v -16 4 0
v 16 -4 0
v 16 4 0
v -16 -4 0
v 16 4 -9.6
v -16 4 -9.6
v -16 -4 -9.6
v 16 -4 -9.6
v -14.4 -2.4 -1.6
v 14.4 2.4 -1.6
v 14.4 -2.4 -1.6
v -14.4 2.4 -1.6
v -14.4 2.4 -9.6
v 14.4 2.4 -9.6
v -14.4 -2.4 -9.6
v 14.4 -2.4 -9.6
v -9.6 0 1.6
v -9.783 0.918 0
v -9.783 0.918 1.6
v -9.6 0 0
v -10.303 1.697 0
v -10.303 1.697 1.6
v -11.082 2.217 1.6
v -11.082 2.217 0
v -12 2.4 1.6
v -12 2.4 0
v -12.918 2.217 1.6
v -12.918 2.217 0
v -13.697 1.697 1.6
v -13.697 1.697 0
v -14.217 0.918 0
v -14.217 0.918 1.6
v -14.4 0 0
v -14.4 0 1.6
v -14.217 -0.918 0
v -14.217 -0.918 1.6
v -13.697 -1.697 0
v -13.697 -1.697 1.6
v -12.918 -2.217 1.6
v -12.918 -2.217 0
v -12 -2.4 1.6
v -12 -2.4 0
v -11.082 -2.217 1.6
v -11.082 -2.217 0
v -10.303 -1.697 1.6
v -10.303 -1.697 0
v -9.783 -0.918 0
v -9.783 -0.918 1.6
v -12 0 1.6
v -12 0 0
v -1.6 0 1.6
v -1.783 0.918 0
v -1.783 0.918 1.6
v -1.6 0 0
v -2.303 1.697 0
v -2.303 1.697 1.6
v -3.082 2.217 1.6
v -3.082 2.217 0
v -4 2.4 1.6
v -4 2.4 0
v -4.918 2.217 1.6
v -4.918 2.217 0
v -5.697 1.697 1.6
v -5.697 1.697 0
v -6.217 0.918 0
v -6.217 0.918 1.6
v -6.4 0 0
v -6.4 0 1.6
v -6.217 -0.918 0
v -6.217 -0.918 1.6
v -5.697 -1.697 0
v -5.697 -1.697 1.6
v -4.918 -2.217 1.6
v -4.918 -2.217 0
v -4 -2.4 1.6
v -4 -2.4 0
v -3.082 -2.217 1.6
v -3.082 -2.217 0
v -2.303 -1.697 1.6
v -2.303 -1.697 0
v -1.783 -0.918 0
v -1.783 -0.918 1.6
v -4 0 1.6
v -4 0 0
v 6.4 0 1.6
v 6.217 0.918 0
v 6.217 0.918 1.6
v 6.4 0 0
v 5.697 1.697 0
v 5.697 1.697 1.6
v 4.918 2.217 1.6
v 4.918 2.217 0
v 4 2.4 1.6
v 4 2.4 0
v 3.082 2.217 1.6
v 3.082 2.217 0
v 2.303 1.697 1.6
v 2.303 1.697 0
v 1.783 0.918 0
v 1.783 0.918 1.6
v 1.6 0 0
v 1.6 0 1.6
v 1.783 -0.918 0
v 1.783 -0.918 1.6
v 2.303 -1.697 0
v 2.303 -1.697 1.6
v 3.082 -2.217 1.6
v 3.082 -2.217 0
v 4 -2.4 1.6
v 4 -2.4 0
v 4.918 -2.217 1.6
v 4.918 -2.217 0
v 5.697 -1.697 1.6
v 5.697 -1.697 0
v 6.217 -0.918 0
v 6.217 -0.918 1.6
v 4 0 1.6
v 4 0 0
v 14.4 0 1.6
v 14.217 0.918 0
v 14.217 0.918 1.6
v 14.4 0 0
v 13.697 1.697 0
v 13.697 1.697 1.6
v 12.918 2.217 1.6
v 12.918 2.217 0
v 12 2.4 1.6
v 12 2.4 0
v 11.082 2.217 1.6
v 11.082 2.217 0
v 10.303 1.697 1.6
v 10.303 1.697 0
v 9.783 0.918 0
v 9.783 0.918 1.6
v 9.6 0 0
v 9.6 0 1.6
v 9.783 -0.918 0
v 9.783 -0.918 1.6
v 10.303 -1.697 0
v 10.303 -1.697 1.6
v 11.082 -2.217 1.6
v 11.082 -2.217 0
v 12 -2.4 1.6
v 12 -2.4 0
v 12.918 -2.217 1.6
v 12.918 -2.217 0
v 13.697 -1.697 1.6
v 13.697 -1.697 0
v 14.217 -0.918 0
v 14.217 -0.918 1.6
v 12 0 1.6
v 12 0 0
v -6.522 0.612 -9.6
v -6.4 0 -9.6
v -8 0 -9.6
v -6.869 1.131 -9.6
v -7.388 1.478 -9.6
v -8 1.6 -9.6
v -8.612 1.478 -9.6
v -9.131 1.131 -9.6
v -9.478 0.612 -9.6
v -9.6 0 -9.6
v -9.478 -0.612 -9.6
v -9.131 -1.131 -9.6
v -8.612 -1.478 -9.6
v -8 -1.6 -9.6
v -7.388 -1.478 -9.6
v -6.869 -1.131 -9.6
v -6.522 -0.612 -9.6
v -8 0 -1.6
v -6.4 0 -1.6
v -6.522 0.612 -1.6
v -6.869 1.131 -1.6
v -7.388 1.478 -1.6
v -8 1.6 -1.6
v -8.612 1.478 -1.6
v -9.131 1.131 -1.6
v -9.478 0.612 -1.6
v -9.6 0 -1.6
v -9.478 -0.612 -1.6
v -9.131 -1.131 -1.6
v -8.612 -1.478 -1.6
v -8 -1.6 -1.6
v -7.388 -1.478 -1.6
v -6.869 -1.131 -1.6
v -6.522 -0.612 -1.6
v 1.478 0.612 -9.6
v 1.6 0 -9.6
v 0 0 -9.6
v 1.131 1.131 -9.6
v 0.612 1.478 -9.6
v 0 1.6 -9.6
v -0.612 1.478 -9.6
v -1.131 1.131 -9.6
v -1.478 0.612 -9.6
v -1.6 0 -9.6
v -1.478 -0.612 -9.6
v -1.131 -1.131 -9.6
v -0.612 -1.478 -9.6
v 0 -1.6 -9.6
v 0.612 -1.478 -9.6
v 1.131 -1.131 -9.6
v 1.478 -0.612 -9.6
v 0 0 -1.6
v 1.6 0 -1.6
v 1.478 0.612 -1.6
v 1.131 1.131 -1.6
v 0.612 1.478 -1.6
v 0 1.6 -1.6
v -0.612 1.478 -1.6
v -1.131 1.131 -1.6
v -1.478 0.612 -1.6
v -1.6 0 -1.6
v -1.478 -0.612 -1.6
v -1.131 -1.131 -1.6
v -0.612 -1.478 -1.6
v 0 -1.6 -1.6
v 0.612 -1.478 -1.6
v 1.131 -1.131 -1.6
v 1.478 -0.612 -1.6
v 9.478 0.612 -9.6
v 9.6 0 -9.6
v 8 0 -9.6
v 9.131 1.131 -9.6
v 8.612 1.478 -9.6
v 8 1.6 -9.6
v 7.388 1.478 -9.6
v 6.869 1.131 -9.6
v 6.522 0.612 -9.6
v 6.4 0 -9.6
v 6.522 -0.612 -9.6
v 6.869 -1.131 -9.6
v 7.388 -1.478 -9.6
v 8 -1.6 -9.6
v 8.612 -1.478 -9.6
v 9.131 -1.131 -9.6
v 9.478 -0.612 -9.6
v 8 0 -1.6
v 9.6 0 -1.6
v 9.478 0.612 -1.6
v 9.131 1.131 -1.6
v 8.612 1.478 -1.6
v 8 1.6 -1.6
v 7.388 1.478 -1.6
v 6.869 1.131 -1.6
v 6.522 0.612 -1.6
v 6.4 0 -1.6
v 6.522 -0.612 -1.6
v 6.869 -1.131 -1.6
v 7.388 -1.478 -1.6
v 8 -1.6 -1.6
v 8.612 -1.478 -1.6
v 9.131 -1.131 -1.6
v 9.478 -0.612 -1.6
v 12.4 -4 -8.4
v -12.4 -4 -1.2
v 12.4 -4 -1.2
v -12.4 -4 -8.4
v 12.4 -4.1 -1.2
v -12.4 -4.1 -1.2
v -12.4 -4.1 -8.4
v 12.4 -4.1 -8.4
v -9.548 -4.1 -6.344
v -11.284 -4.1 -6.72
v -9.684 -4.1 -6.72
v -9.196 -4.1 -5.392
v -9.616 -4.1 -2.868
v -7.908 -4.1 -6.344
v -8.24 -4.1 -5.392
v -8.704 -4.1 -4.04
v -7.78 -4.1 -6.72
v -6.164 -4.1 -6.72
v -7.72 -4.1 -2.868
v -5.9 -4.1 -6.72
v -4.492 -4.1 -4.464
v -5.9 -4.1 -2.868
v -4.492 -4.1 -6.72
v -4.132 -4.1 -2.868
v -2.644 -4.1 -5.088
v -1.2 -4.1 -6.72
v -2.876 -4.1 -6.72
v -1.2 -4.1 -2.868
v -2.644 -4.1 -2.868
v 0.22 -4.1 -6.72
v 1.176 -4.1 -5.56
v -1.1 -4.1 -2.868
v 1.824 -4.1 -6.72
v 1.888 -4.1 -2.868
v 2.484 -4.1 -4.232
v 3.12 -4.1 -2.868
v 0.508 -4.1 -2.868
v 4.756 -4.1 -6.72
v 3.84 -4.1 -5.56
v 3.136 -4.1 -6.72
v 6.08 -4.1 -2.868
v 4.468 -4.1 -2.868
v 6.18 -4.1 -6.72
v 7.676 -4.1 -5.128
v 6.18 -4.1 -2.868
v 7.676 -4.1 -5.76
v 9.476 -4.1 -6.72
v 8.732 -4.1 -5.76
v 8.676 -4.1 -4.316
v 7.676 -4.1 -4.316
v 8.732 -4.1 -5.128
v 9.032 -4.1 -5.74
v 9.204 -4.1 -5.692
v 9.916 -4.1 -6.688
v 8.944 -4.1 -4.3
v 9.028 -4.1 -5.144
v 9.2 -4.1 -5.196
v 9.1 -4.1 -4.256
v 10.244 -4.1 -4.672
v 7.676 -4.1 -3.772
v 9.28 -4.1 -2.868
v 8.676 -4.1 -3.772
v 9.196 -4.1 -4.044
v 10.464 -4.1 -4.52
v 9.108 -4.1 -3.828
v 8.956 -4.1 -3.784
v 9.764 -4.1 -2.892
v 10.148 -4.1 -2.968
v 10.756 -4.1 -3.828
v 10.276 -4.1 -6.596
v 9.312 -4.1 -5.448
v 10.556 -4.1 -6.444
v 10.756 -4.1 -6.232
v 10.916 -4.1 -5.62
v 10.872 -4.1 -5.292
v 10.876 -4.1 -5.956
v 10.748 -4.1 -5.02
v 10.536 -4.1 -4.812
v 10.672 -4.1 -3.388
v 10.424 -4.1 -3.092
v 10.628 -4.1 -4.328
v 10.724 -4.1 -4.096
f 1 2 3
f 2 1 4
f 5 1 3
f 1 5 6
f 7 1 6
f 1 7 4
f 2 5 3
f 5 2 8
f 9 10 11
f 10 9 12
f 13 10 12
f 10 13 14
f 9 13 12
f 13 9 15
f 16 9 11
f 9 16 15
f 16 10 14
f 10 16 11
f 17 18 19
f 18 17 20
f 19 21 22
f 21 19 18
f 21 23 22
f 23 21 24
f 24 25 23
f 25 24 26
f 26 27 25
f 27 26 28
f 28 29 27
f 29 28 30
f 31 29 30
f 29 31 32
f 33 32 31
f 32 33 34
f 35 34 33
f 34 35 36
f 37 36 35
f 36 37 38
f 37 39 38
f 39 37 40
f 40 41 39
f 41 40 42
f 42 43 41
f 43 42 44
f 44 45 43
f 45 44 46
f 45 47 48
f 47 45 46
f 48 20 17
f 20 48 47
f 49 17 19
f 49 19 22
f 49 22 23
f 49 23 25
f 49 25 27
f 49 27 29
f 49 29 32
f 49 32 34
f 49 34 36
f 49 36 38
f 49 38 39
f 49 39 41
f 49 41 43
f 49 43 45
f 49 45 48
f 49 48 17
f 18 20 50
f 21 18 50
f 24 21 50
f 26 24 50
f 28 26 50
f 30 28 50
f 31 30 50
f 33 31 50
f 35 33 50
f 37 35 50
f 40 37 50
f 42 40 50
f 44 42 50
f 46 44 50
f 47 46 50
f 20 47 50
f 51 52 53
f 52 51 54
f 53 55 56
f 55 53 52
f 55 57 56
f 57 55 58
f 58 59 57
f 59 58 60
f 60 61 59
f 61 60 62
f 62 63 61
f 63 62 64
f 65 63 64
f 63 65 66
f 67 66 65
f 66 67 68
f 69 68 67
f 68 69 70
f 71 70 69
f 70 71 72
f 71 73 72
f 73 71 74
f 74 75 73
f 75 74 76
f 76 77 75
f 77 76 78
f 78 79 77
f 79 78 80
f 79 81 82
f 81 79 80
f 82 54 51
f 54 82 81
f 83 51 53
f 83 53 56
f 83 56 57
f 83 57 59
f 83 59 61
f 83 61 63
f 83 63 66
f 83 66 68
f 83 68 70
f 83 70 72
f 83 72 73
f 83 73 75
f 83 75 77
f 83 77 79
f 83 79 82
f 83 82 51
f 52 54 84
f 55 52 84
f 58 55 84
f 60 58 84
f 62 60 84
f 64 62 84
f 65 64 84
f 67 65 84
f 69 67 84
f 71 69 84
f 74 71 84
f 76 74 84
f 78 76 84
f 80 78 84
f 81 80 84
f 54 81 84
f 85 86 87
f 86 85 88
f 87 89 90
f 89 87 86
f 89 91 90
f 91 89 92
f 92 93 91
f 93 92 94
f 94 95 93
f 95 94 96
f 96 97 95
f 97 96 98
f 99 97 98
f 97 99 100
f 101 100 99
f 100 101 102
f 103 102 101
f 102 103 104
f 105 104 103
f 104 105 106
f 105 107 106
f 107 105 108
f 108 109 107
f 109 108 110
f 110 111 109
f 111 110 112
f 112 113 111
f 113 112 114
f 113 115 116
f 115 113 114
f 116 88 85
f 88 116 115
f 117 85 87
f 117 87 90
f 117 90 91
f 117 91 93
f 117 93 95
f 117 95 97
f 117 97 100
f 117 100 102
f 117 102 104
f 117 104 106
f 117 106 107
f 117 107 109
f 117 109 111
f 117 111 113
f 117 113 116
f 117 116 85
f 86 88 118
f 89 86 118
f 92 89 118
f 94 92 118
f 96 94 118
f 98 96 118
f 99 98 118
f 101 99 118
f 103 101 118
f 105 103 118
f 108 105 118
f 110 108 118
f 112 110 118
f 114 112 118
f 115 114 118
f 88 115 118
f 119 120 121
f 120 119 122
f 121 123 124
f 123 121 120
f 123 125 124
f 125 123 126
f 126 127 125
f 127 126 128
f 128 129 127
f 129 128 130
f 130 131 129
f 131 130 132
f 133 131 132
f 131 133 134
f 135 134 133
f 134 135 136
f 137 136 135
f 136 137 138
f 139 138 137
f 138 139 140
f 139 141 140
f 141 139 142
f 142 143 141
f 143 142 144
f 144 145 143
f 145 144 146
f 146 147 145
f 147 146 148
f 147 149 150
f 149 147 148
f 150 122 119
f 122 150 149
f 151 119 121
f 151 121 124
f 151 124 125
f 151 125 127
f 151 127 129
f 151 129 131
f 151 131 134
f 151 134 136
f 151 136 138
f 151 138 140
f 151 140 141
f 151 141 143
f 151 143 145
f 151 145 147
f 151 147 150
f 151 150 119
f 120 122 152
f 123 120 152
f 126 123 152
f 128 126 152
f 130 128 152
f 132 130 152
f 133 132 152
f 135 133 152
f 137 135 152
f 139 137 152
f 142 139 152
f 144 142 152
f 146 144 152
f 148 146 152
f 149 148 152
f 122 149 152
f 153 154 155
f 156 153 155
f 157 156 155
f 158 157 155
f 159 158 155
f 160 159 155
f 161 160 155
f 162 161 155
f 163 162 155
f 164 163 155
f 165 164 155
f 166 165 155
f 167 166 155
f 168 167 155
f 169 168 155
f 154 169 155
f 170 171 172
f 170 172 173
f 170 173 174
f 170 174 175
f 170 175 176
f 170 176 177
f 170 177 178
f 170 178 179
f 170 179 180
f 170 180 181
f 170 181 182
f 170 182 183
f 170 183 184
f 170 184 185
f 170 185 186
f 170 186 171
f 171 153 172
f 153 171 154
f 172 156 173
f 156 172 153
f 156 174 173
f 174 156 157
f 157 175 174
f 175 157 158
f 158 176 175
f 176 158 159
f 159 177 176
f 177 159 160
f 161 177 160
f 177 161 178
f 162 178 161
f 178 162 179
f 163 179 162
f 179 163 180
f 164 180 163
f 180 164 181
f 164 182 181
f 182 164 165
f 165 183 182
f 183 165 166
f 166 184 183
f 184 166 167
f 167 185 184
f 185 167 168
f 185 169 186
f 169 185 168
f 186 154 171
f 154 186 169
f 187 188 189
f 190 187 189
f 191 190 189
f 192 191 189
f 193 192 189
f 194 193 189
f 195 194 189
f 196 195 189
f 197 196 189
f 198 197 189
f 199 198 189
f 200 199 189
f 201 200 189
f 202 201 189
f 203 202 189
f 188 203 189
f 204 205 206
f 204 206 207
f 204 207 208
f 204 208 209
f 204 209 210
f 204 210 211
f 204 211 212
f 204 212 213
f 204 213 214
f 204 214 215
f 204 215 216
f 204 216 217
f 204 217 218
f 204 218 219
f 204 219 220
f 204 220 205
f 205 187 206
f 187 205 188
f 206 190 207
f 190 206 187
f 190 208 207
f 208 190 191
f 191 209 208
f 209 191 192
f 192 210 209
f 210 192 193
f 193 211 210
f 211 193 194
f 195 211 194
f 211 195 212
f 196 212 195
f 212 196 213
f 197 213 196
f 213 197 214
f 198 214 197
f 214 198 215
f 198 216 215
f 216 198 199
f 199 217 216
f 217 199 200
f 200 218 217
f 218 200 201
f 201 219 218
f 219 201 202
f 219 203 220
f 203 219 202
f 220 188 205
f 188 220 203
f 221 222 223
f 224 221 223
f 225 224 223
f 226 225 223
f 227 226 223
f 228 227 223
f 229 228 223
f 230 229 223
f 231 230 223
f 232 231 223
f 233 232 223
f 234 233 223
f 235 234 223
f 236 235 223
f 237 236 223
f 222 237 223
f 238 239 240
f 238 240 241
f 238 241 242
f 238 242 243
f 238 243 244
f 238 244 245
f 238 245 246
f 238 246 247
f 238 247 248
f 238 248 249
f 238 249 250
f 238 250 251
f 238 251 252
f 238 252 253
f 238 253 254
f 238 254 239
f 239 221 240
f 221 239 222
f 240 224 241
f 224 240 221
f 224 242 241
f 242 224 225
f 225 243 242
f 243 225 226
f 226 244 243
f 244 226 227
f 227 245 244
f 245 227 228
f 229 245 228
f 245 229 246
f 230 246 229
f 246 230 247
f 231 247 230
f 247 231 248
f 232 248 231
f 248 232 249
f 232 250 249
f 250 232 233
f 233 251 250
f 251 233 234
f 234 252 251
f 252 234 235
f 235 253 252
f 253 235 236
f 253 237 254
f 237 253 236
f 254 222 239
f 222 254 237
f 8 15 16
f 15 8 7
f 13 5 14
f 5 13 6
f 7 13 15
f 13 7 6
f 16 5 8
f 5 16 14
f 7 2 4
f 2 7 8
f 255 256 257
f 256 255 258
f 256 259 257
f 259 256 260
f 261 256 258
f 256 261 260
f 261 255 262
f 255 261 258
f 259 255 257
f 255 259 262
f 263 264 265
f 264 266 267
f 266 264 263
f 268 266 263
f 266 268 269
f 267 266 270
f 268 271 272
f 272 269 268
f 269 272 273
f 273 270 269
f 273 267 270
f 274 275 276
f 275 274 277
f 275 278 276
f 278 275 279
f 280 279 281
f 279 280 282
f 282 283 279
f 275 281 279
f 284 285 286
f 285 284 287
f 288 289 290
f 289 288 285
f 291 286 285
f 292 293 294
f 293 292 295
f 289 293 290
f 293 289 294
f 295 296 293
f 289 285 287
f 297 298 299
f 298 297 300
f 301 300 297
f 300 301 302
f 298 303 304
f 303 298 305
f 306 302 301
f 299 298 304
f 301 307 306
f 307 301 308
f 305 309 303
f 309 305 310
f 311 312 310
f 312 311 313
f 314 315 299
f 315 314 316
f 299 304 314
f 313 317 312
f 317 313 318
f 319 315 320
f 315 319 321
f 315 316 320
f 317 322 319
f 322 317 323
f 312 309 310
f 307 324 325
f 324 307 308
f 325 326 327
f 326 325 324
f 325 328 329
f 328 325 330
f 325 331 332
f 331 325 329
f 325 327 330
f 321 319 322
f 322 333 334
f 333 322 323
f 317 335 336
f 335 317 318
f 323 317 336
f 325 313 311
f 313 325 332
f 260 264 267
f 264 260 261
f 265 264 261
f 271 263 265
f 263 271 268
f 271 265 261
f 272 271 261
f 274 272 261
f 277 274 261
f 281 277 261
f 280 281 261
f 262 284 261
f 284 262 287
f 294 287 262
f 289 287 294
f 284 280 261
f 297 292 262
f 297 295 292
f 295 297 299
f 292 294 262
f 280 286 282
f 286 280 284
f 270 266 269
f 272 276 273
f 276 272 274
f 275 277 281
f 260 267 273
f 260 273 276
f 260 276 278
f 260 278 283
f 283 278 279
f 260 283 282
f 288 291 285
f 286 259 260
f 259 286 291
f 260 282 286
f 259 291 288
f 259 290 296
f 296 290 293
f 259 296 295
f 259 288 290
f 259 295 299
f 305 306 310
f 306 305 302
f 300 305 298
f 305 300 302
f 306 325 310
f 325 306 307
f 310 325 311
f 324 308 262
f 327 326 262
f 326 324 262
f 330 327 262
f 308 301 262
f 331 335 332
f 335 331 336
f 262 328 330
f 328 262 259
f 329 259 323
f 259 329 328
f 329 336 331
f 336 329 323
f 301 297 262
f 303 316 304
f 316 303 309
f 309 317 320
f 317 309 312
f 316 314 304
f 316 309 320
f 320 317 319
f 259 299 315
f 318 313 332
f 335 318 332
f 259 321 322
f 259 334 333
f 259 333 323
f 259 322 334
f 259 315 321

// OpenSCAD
// file: ../p/4-4edge.scad
use <../lib.scad>
function ldraw_lib__4_4edge() = [
// 0 Circle 1.0
// 0 Name: 4-4edge.dat
// 0 Author: James Jessiman
// 0 !LDRAW_ORG Primitive UPDATE 2017-01
// 0 !LICENSE Licensed under CC BY 2.0 and CC BY 4.0 : see CAreadme.txt
// 
// 0 BFC CERTIFY CCW
  [0,"BFC","CERTIFY"],
  [0,"BFC","CCW"],
// 
// 0 !HISTORY 1998-12-15 [PTadmin] Official Update 1998-10
// 0 !HISTORY 2005-12-28 [PTadmin] Official Update 2005-01
// 0 !HISTORY 2007-06-24 [PTadmin] Header formatted for Contributor Agreement
// 0 !HISTORY 2008-07-01 [PTadmin] Official Update 2008-01
// 0 !HISTORY 2017-01-15 [Steffen] BFCed
// 0 !HISTORY 2017-12-30 [PTadmin] Official Update 2017-01
// 
// 
// 2 24 1 0 0 0.9239 0 0.3827
  [2,24,1,0,0,0.9239,0,0.3827],
// 2 24 0.9239 0 0.3827 0.7071 0 0.7071
  [2,24,0.9239,0,0.3827,0.7071,0,0.7071],
// 2 24 0.7071 0 0.7071 0.3827 0 0.9239
  [2,24,0.7071,0,0.7071,0.3827,0,0.9239],
// 2 24 0.3827 0 0.9239 0 0 1
  [2,24,0.3827,0,0.9239,0,0,1],
// 2 24 0 0 1 -0.3827 0 0.9239
  [2,24,0,0,1,-0.3827,0,0.9239],
// 2 24 -0.3827 0 0.9239 -0.7071 0 0.7071
  [2,24,-0.3827,0,0.9239,-0.7071,0,0.7071],
// 2 24 -0.7071 0 0.7071 -0.9239 0 0.3827
  [2,24,-0.7071,0,0.7071,-0.9239,0,0.3827],
// 2 24 -0.9239 0 0.3827 -1 0 -0
  [2,24,-0.9239,0,0.3827,-1,0,-0],
// 2 24 -1 0 -0 -0.9239 0 -0.3827
  [2,24,-1,0,-0,-0.9239,0,-0.3827],
// 2 24 -0.9239 0 -0.3827 -0.7071 0 -0.7071
  [2,24,-0.9239,0,-0.3827,-0.7071,0,-0.7071],
// 2 24 -0.7071 0 -0.7071 -0.3827 0 -0.9239
  [2,24,-0.7071,0,-0.7071,-0.3827,0,-0.9239],
// 2 24 -0.3827 0 -0.9239 0 0 -1
  [2,24,-0.3827,0,-0.9239,0,0,-1],
// 2 24 0 0 -1 0.3827 0 -0.9239
  [2,24,0,0,-1,0.3827,0,-0.9239],
// 2 24 0.3827 0 -0.9239 0.7071 0 -0.7071
  [2,24,0.3827,0,-0.9239,0.7071,0,-0.7071],
// 2 24 0.7071 0 -0.7071 0.9239 0 -0.3827
  [2,24,0.7071,0,-0.7071,0.9239,0,-0.3827],
// 2 24 0.9239 0 -0.3827 1 0 0
  [2,24,0.9239,0,-0.3827,1,0,0],
];
module ldraw_lib__4_4edge(step=0, col=false, unit=2/5, alt=false, line=0.2, solid=!$preview)
    makepoly(ldraw_lib__4_4edge(), step=step, col=col, unit=unit, alt=alt, line=line, solid=solid);
ldraw_lib__4_4edge(line=0.2);
// file: ../p/4-4disc.scad
use <../lib.scad>
function ldraw_lib__4_4disc() = [
// 0 Disc 1.0
// 0 Name: 4-4disc.dat
// 0 Author: James Jessiman
// 0 !LDRAW_ORG Primitive UPDATE 2002-02
// 0 !LICENSE Licensed under CC BY 2.0 and CC BY 4.0 : see CAreadme.txt
// 
// 0 BFC CERTIFY CCW
  [0,"BFC","CERTIFY"],
  [0,"BFC","CCW"],
// 
// 0 !HISTORY 1998-12-15 [PTadmin] Official Update 1998-10
// 0 !HISTORY 2002-03-23 [sbliss] Added BFC statement
// 0 !HISTORY 2002-04-25 [PTadmin] Official Update 2002-02
// 0 !HISTORY 2007-06-24 [PTadmin] Header formatted for Contributor Agreement
// 0 !HISTORY 2008-07-01 [PTadmin] Official Update 2008-01
// 
// 
// 3 16 0 0 0 1 0 0 0.9239 0 0.3827
  [3,16,0,0,0,1,0,0,0.9239,0,0.3827],
// 3 16 0 0 0 0.9239 0 0.3827 0.7071 0 0.7071
  [3,16,0,0,0,0.9239,0,0.3827,0.7071,0,0.7071],
// 3 16 0 0 0 0.7071 0 0.7071 0.3827 0 0.9239
  [3,16,0,0,0,0.7071,0,0.7071,0.3827,0,0.9239],
// 3 16 0 0 0 0.3827 0 0.9239 0 0 1
  [3,16,0,0,0,0.3827,0,0.9239,0,0,1],
// 3 16 0 0 0 0 0 1 -0.3827 0 0.9239
  [3,16,0,0,0,0,0,1,-0.3827,0,0.9239],
// 3 16 0 0 0 -0.3827 0 0.9239 -0.7071 0 0.7071
  [3,16,0,0,0,-0.3827,0,0.9239,-0.7071,0,0.7071],
// 3 16 0 0 0 -0.7071 0 0.7071 -0.9239 0 0.3827
  [3,16,0,0,0,-0.7071,0,0.7071,-0.9239,0,0.3827],
// 3 16 0 0 0 -0.9239 0 0.3827 -1 0 -0
  [3,16,0,0,0,-0.9239,0,0.3827,-1,0,-0],
// 3 16 0 0 0 -1 0 -0 -0.9239 0 -0.3827
  [3,16,0,0,0,-1,0,-0,-0.9239,0,-0.3827],
// 3 16 0 0 0 -0.9239 0 -0.3827 -0.7071 0 -0.7071
  [3,16,0,0,0,-0.9239,0,-0.3827,-0.7071,0,-0.7071],
// 3 16 0 0 0 -0.7071 0 -0.7071 -0.3827 0 -0.9239
  [3,16,0,0,0,-0.7071,0,-0.7071,-0.3827,0,-0.9239],
// 3 16 0 0 0 -0.3827 0 -0.9239 0 0 -1
  [3,16,0,0,0,-0.3827,0,-0.9239,0,0,-1],
// 3 16 0 0 0 0 0 -1 0.3827 0 -0.9239
  [3,16,0,0,0,0,0,-1,0.3827,0,-0.9239],
// 3 16 0 0 0 0.3827 0 -0.9239 0.7071 0 -0.7071
  [3,16,0,0,0,0.3827,0,-0.9239,0.7071,0,-0.7071],
// 3 16 0 0 0 0.7071 0 -0.7071 0.9239 0 -0.3827
  [3,16,0,0,0,0.7071,0,-0.7071,0.9239,0,-0.3827],
// 3 16 0 0 0 0.9239 0 -0.3827 1 0 0
  [3,16,0,0,0,0.9239,0,-0.3827,1,0,0],
// 0
];
module ldraw_lib__4_4disc(step=0, col=false, unit=2/5, alt=false, line=0.2, solid=!$preview)
    makepoly(ldraw_lib__4_4disc(), step=step, col=col, unit=unit, alt=alt, line=line, solid=solid);
ldraw_lib__4_4disc(line=0.2);
// file: ../p/4-4cyli.scad
use <../lib.scad>
$fa=1; $fs=0.2;
function ldraw_lib__4_4cyli(realsolid=false) = [
// 0 Cylinder 1.0
// 0 Name: 4-4cyli.dat
// 0 Author: James Jessiman
// 0 !LDRAW_ORG Primitive UPDATE 2005-01
// 0 !LICENSE Licensed under CC BY 2.0 and CC BY 4.0 : see CAreadme.txt
// 
// 0 BFC CERTIFY CCW
  [0,"BFC","CERTIFY"],
  [0,"BFC","CCW"],
// 
// 0 !HISTORY 1998-12-15 [PTadmin] Official Update 1998-10
// 0 !HISTORY 2002-03-23 [sbliss] Added BFC statement; merged headers from files in distributions LDraw 0.27 and Complete.
// 0 !HISTORY 2002-04-25 [PTadmin] Official Update 2002-02
// 0 !HISTORY 2004-12-14 [guyvivan] BFC CCW
// 0 !HISTORY 2005-12-28 [PTadmin] Official Update 2005-01
// 0 !HISTORY 2007-06-24 [PTadmin] Header formatted for Contributor Agreement
// 0 !HISTORY 2008-07-01 [PTadmin] Official Update 2008-01
// 
// 
// 4 16 1 1 0 0.9239 1 0.3827 0.9239 0 0.3827 1 0 0
  [4,16,1,1,0,0.9239,1,0.3827,0.9239,0,0.3827,1,0,0],
// 5 24 1 0 0 1 1 0 0.9239 0 0.3827 0.9239 0 -0.3827
  [5,24,1,0,0,1,1,0,0.9239,0,0.3827,0.9239,0,-0.3827],
// 4 16 0.9239 1 0.3827 0.7071 1 0.7071 0.7071 0 0.7071 0.9239 0 0.3827
  [4,16,0.9239,1,0.3827,0.7071,1,0.7071,0.7071,0,0.7071,0.9239,0,0.3827],
// 5 24 0.9239 0 0.3827 0.9239 1 0.3827 0.7071 0 0.7071 1 0 0
  [5,24,0.9239,0,0.3827,0.9239,1,0.3827,0.7071,0,0.7071,1,0,0],
// 4 16 0.7071 1 0.7071 0.3827 1 0.9239 0.3827 0 0.9239 0.7071 0 0.7071
  [4,16,0.7071,1,0.7071,0.3827,1,0.9239,0.3827,0,0.9239,0.7071,0,0.7071],
// 5 24 0.7071 0 0.7071 0.7071 1 0.7071 0.3827 0 0.9239 0.9239 0 0.3827
  [5,24,0.7071,0,0.7071,0.7071,1,0.7071,0.3827,0,0.9239,0.9239,0,0.3827],
// 4 16 0.3827 1 0.9239 0 1 1 0 0 1 0.3827 0 0.9239
  [4,16,0.3827,1,0.9239,0,1,1,0,0,1,0.3827,0,0.9239],
// 5 24 0.3827 0 0.9239 0.3827 1 0.9239 0 0 1 0.7071 0 0.7071
  [5,24,0.3827,0,0.9239,0.3827,1,0.9239,0,0,1,0.7071,0,0.7071],
// 4 16 0 1 1 -0.3827 1 0.9239 -0.3827 0 0.9239 0 0 1
  [4,16,0,1,1,-0.3827,1,0.9239,-0.3827,0,0.9239,0,0,1],
// 5 24 0 0 1 0 1 1 -0.3827 0 0.9239 0.3827 0 0.9239
  [5,24,0,0,1,0,1,1,-0.3827,0,0.9239,0.3827,0,0.9239],
// 4 16 -0.3827 1 0.9239 -0.7071 1 0.7071 -0.7071 0 0.7071 -0.3827 0 0.9239
  [4,16,-0.3827,1,0.9239,-0.7071,1,0.7071,-0.7071,0,0.7071,-0.3827,0,0.9239],
// 5 24 -0.3827 0 0.9239 -0.3827 1 0.9239 -0.7071 0 0.7071 0 0 1
  [5,24,-0.3827,0,0.9239,-0.3827,1,0.9239,-0.7071,0,0.7071,0,0,1],
// 4 16 -0.7071 1 0.7071 -0.9239 1 0.3827 -0.9239 0 0.3827 -0.7071 0 0.7071
  [4,16,-0.7071,1,0.7071,-0.9239,1,0.3827,-0.9239,0,0.3827,-0.7071,0,0.7071],
// 5 24 -0.7071 0 0.7071 -0.7071 1 0.7071 -0.9239 0 0.3827 -0.3827 0 0.9239
  [5,24,-0.7071,0,0.7071,-0.7071,1,0.7071,-0.9239,0,0.3827,-0.3827,0,0.9239],
// 4 16 -0.9239 1 0.3827 -1 1 0 -1 0 0 -0.9239 0 0.3827
  [4,16,-0.9239,1,0.3827,-1,1,0,-1,0,0,-0.9239,0,0.3827],
// 5 24 -0.9239 0 0.3827 -0.9239 1 0.3827 -1 0 0 -0.7071 0 0.7071
  [5,24,-0.9239,0,0.3827,-0.9239,1,0.3827,-1,0,0,-0.7071,0,0.7071],
// 4 16 -1 1 0 -0.9239 1 -0.3827 -0.9239 0 -0.3827 -1 0 0
  [4,16,-1,1,0,-0.9239,1,-0.3827,-0.9239,0,-0.3827,-1,0,0],
// 5 24 -1 0 0 -1 1 0 -0.9239 0 -0.3827 -0.9239 0 0.3827
  [5,24,-1,0,0,-1,1,0,-0.9239,0,-0.3827,-0.9239,0,0.3827],
// 4 16 -0.9239 1 -0.3827 -0.7071 1 -0.7071 -0.7071 0 -0.7071 -0.9239 0 -0.3827
  [4,16,-0.9239,1,-0.3827,-0.7071,1,-0.7071,-0.7071,0,-0.7071,-0.9239,0,-0.3827],
// 5 24 -0.9239 0 -0.3827 -0.9239 1 -0.3827 -0.7071 0 -0.7071 -1 0 0
  [5,24,-0.9239,0,-0.3827,-0.9239,1,-0.3827,-0.7071,0,-0.7071,-1,0,0],
// 4 16 -0.7071 1 -0.7071 -0.3827 1 -0.9239 -0.3827 0 -0.9239 -0.7071 0 -0.7071
  [4,16,-0.7071,1,-0.7071,-0.3827,1,-0.9239,-0.3827,0,-0.9239,-0.7071,0,-0.7071],
// 5 24 -0.7071 0 -0.7071 -0.7071 1 -0.7071 -0.3827 0 -0.9239 -0.9239 0 -0.3827
  [5,24,-0.7071,0,-0.7071,-0.7071,1,-0.7071,-0.3827,0,-0.9239,-0.9239,0,-0.3827],
// 4 16 -0.3827 1 -0.9239 0 1 -1 0 0 -1 -0.3827 0 -0.9239
  [4,16,-0.3827,1,-0.9239,0,1,-1,0,0,-1,-0.3827,0,-0.9239],
// 5 24 -0.3827 0 -0.9239 -0.3827 1 -0.9239 0 0 -1 -0.7071 0 -0.7071
  [5,24,-0.3827,0,-0.9239,-0.3827,1,-0.9239,0,0,-1,-0.7071,0,-0.7071],
// 4 16 0 1 -1 0.3827 1 -0.9239 0.3827 0 -0.9239 0 0 -1
  [4,16,0,1,-1,0.3827,1,-0.9239,0.3827,0,-0.9239,0,0,-1],
// 5 24 0 0 -1 0 1 -1 0.3827 0 -0.9239 -0.3827 0 -0.9239
  [5,24,0,0,-1,0,1,-1,0.3827,0,-0.9239,-0.3827,0,-0.9239],
// 4 16 0.3827 1 -0.9239 0.7071 1 -0.7071 0.7071 0 -0.7071 0.3827 0 -0.9239
  [4,16,0.3827,1,-0.9239,0.7071,1,-0.7071,0.7071,0,-0.7071,0.3827,0,-0.9239],
// 5 24 0.3827 0 -0.9239 0.3827 1 -0.9239 0.7071 0 -0.7071 0 0 -1
  [5,24,0.3827,0,-0.9239,0.3827,1,-0.9239,0.7071,0,-0.7071,0,0,-1],
// 4 16 0.7071 1 -0.7071 0.9239 1 -0.3827 0.9239 0 -0.3827 0.7071 0 -0.7071
  [4,16,0.7071,1,-0.7071,0.9239,1,-0.3827,0.9239,0,-0.3827,0.7071,0,-0.7071],
// 5 24 0.7071 0 -0.7071 0.7071 1 -0.7071 0.9239 0 -0.3827 0.3827 0 -0.9239
  [5,24,0.7071,0,-0.7071,0.7071,1,-0.7071,0.9239,0,-0.3827,0.3827,0,-0.9239],
// 4 16 0.9239 1 -0.3827 1 1 0 1 0 0 0.9239 0 -0.3827
  [4,16,0.9239,1,-0.3827,1,1,0,1,0,0,0.9239,0,-0.3827],
// 5 24 0.9239 0 -0.3827 0.9239 1 -0.3827 1 0 0 0.7071 0 -0.7071
  [5,24,0.9239,0,-0.3827,0.9239,1,-0.3827,1,0,0,0.7071,0,-0.7071],
// 0
];
module ldraw_lib__4_4cyli(step=0, col=false, unit=2/5, alt=false, line=0.2, solid=!$preview)
    makepoly(ldraw_lib__4_4cyli(solid), step=step, col=col, unit=unit, alt=alt, line=line, solid=solid);
ldraw_lib__4_4cyli(line=0.2);
// file: ../p/stud3.scad
use <../lib.scad>
use <4-4cyli.scad>
use <4-4disc.scad>
use <4-4edge.scad>
function ldraw_lib__stud3() = [
// 0 Stud Tube Solid
// 0 Name: stud3.dat
// 0 Author: James Jessiman
// 0 !LDRAW_ORG Primitive UPDATE 2012-01
// 0 !LICENSE Licensed under CC BY 4.0 : see CAreadme.txt
// 
// 0 BFC CERTIFY CCW
  [0,"BFC","CERTIFY"],
  [0,"BFC","CCW"],
// 
// 0 !HISTORY 2002-04-04 [sbliss] Modified for BFC compliance
// 0 !HISTORY 2002-04-25 [PTadmin] Official Update 2002-02
// 0 !HISTORY 2007-06-24 [PTadmin] Header formatted for Contributor Agreement
// 0 !HISTORY 2008-07-01 [PTadmin] Official Update 2008-01
// 0 !HISTORY 2012-02-16 [Philo] Changed to CCW
// 0 !HISTORY 2012-03-30 [PTadmin] Official Update 2012-01
// 
// 
// 1 16 0 -4 0 4 0 0 0 1 0 0 0 4 4-4edge.dat
  [1,16,0,-4,0,4,0,0,0,1,0,0,0,4, ldraw_lib__4_4edge()],
// 1 16 0 0 0 4 0 0 0 1 0 0 0 4 4-4edge.dat
  [1,16,0,0,0,4,0,0,0,1,0,0,0,4, ldraw_lib__4_4edge()],
// 1 16 0 -4 0 4 0 0 0 1 0 0 0 4 4-4disc.dat
  [1,16,0,-4,0,4,0,0,0,1,0,0,0,4, ldraw_lib__4_4disc()],
  [-1,16,0,0,0,4,0,0,0,-1,0,0,0,4, ldraw_lib__4_4disc()],
// 1 16 0 -4 0 4 0 0 0 4 0 0 0 4 4-4cyli.dat
  [1,16,0,-4,0,4,0,0,0,4,0,0,0,4, ldraw_lib__4_4cyli()],
];
module ldraw_lib__stud3(step=0, col=false, unit=2/5, alt=false, line=0.2, solid=!$preview)
    makepoly(ldraw_lib__stud3(), step=step, col=col, unit=unit, alt=alt, line=line, solid=solid);
ldraw_lib__stud3(line=0.2);
// file: ../p/stud.scad
use <../lib.scad>
use <4-4cyli.scad>
use <4-4disc.scad>
use <4-4edge.scad>
function ldraw_lib__stud() = [
// 0 Stud
// 0 Name: stud.dat
// 0 Author: James Jessiman
// 0 !LDRAW_ORG Primitive UPDATE 2012-01
// 0 !LICENSE Licensed under CC BY 4.0 : see CAreadme.txt
// 
// 0 BFC CERTIFY CCW
  [0,"BFC","CERTIFY"],
  [0,"BFC","CCW"],
// 
// 0 !HISTORY 2002-04-04 [sbliss] Modified for BFC compliance
// 0 !HISTORY 2002-04-25 [PTadmin] Official Update 2002-02
// 0 !HISTORY 2007-06-24 [PTadmin] Header formatted for Contributor Agreement
// 0 !HISTORY 2008-07-01 [PTadmin] Official Update 2008-01
// 0 !HISTORY 2012-02-16 [Philo] Changed to CCW
// 0 !HISTORY 2012-03-30 [PTadmin] Official Update 2012-01
// 
// 
// 1 16 0 0 0 6 0 0 0 1 0 0 0 6 4-4edge.dat
  [1,16,0,0,0,6,0,0,0,1,0,0,0,6, ldraw_lib__4_4edge()],
// 1 16 0 -4 0 6 0 0 0 1 0 0 0 6 4-4edge.dat
  [1,16,0,-4,0,6,0,0,0,1,0,0,0,6, ldraw_lib__4_4edge()],
// 1 16 0 0 0 6 0 0 0 -4 0 0 0 6 4-4cyli.dat
  [1,16,0,0,0,6,0,0,0,-4,0,0,0,6, ldraw_lib__4_4cyli()],
// 1 16 0 -4 0 6 0 0 0 1 0 0 0 6 4-4disc.dat
  [1,16,0,-4,0,6,0,0,0,1,0,0,0,6, ldraw_lib__4_4disc()],
  [-1,16,0,0,0,6,0,0,0,-1,0,0,0,6, ldraw_lib__4_4disc()],
];
module ldraw_lib__stud(step=0, col=false, unit=2/5, alt=false, line=0.2, solid=!$preview)
    makepoly(ldraw_lib__stud(), step=step, col=col, unit=unit, alt=alt, line=line, solid=solid);
ldraw_lib__stud(line=0.2);
// file: ../p/box5.scad
use <../lib.scad>
function ldraw_lib__box5() = [
// 0 Box with 5 Faces and All Edges
// 0 Name: box5.dat
// 0 Author: James Jessiman
// 0 !LDRAW_ORG Primitive UPDATE 2012-01
// 0 !LICENSE Licensed under CC BY 2.0 and CC BY 4.0 : see CAreadme.txt
// 
// 0 BFC CERTIFY CCW
  [0,"BFC","CERTIFY"],
  [0,"BFC","CCW"],
// 
// 0 !HISTORY 2002-04-03 [sbliss] Modified for BFC compliance
// 0 !HISTORY 2002-04-25 [PTadmin] Official Update 2002-02
// 0 !HISTORY 2007-06-24 [PTadmin] Header formatted for Contributor Agreement
// 0 !HISTORY 2008-07-01 [PTadmin] Official Update 2008-01
// 0 !HISTORY 2012-02-16 [Philo] Changed to CCW
// 0 !HISTORY 2012-03-30 [PTadmin] Official Update 2012-01
// 
// 
// 2 24 1 1 1 -1 1 1
  [2,24,1,1,1,-1,1,1],
// 2 24 -1 1 1 -1 1 -1
  [2,24,-1,1,1,-1,1,-1],
// 2 24 -1 1 -1 1 1 -1
  [2,24,-1,1,-1,1,1,-1],
// 2 24 1 1 -1 1 1 1
  [2,24,1,1,-1,1,1,1],
// 2 24 1 0 1 -1 0 1
  [2,24,1,0,1,-1,0,1],
// 2 24 -1 0 1 -1 0 -1
  [2,24,-1,0,1,-1,0,-1],
// 2 24 -1 0 -1 1 0 -1
  [2,24,-1,0,-1,1,0,-1],
// 2 24 1 0 -1 1 0 1
  [2,24,1,0,-1,1,0,1],
// 2 24 1 0 1 1 1 1
  [2,24,1,0,1,1,1,1],
// 2 24 -1 0 1 -1 1 1
  [2,24,-1,0,1,-1,1,1],
// 2 24 1 0 -1 1 1 -1
  [2,24,1,0,-1,1,1,-1],
// 2 24 -1 0 -1 -1 1 -1
  [2,24,-1,0,-1,-1,1,-1],
// 4 16 -1 1 1 1 1 1 1 1 -1 -1 1 -1
  [4,16,-1,1,1,1,1,1,1,1,-1,-1,1,-1],
// 4 16 -1 1 1 -1 0 1 1 0 1 1 1 1
  [4,16,-1,1,1,-1,0,1,1,0,1,1,1,1],
// 4 16 -1 1 -1 -1 0 -1 -1 0 1 -1 1 1
  [4,16,-1,1,-1,-1,0,-1,-1,0,1,-1,1,1],
// 4 16 1 1 -1 1 0 -1 -1 0 -1 -1 1 -1
  [4,16,1,1,-1,1,0,-1,-1,0,-1,-1,1,-1],
// 4 16 1 1 1 1 0 1 1 0 -1 1 1 -1
  [4,16,1,1,1,1,0,1,1,0,-1,1,1,-1],
];
makepoly(ldraw_lib__box5(), line=0.2);
// file: ../p/box4t.scad
use <../lib.scad>
function ldraw_lib__box4t() = [
// 0 Box with 4 Adjacent Faces and All Edges
// 0 Name: box4t.dat
// 0 Author: Tore Eriksson [Tore_Eriksson]
// 0 !LDRAW_ORG Primitive UPDATE 2003-02
// 0 !LICENSE Licensed under CC BY 2.0 and CC BY 4.0 : see CAreadme.txt
// 
// 0 BFC CERTIFY CCW
  [0,"BFC","CERTIFY"],
  [0,"BFC","CCW"],
// 
// 0 !HISTORY 1997-09-29 [PTadmin] Official Update 1997-15
// 0 !HISTORY 2002-08-31 [izanette] Modified with WINDZ for BFC compliance
// 0 !HISTORY 2003-08-01 [PTadmin] Official Update 2003-02
// 0 !HISTORY 2007-06-24 [PTadmin] Header formatted for Contributor Agreement
// 0 !HISTORY 2008-07-01 [PTadmin] Official Update 2008-01
// 
// 
// 2 24 1 1 1 -1 1 1
  [2,24,1,1,1,-1,1,1],
// 2 24 -1 1 1 -1 1 -1
  [2,24,-1,1,1,-1,1,-1],
// 2 24 -1 1 -1 1 1 -1
  [2,24,-1,1,-1,1,1,-1],
// 2 24 1 1 -1 1 1 1
  [2,24,1,1,-1,1,1,1],
// 2 24 1 0 1 -1 0 1
  [2,24,1,0,1,-1,0,1],
// 2 24 -1 0 1 -1 0 -1
  [2,24,-1,0,1,-1,0,-1],
// 2 24 -1 0 -1 1 0 -1
  [2,24,-1,0,-1,1,0,-1],
// 2 24 1 0 -1 1 0 1
  [2,24,1,0,-1,1,0,1],
// 2 24 1 0 1 1 1 1
  [2,24,1,0,1,1,1,1],
// 2 24 -1 0 1 -1 1 1
  [2,24,-1,0,1,-1,1,1],
// 2 24 1 0 -1 1 1 -1
  [2,24,1,0,-1,1,1,-1],
// 2 24 -1 0 -1 -1 1 -1
  [2,24,-1,0,-1,-1,1,-1],
// 4 16 1 1 1 1 1 -1 -1 1 -1 -1 1 1
  [4,16,1,1,1,1,1,-1,-1,1,-1,-1,1,1],
// 4 16 1 1 1 -1 1 1 -1 0 1 1 0 1
  [4,16,1,1,1,-1,1,1,-1,0,1,1,0,1],
// 4 16 -1 1 1 -1 1 -1 -1 0 -1 -1 0 1
  [4,16,-1,1,1,-1,1,-1,-1,0,-1,-1,0,1],
// 0 4 16 -1 1 -1 -1 0 -1 1 0 -1 1 1 -1
// 4 16 1 1 -1 1 1 1 1 0 1 1 0 -1
  [4,16,1,1,-1,1,1,1,1,0,1,1,0,-1],
// 0
];
makepoly(ldraw_lib__box4t(), line=0.2);
// file: s/3010s01.scad
use <../../lib.scad>
use <../../p/box4t.scad>
use <../../p/box5.scad>
use <../../p/stud.scad>
use <../../p/stud3.scad>
$fa=1; $fs=0.2;
function ldraw_lib__s__3010s01(realsolid=false) = [
// 0 ~Brick  1 x  4 without Front Face
// 0 Name: s\3010s01.dat
// 0 Author: Tony Hafner [hafhead]
// 0 !LDRAW_ORG Subpart UPDATE 2003-02
// 0 !LICENSE Licensed under CC BY 2.0 and CC BY 4.0 : see CAreadme.txt
// 
// 0 BFC CERTIFY CW
  [0,"BFC","CERTIFY"],
  [0,"BFC","CW"],
// 
// 0 !HISTORY 2003-08-01 [PTadmin] Official Update 2003-02
// 0 !HISTORY 2007-08-29 [PTadmin] Header formatted for Contributor Agreement
// 0 !HISTORY 2008-07-01 [PTadmin] Official Update 2008-01
// 
// 
// 1 16 0 24 0 40 0 0 0 -24 0 0 0 10 box4t.dat
  [1,16,0,24,0,40,0,0,0,-24,0,0,0,10, ldraw_lib__box4t(realsolid)],
// 0 BFC INVERTNEXT
  [0,"BFC","INVERTNEXT"],
// 1 16 0 24 0 36 0 0 0 -20 0 0 0 6 box5.dat
  [1,16,0,24,0,36,0,0,0,-20,0,0,0,6, ldraw_lib__box5(realsolid)],
// 1 16 -30 0 0 1 0 0 0 1 0 0 0 1 stud.dat
  [1,16,-30,0,0,1,0,0,0,1,0,0,0,1, ldraw_lib__stud(realsolid)],
// 1 16 -10 0 0 1 0 0 0 1 0 0 0 1 stud.dat
  [1,16,-10,0,0,1,0,0,0,1,0,0,0,1, ldraw_lib__stud(realsolid)],
// 1 16 10 0 0 1 0 0 0 1 0 0 0 1 stud.dat
  [1,16,10,0,0,1,0,0,0,1,0,0,0,1, ldraw_lib__stud(realsolid)],
// 1 16 30 0 0 1 0 0 0 1 0 0 0 1 stud.dat
  [1,16,30,0,0,1,0,0,0,1,0,0,0,1, ldraw_lib__stud(realsolid)],
// 1 16 -20 4 0 1 0 0 0 -5 0 0 0 1 stud3.dat
  [1,16,-20,4,0,1,0,0,0,-5,0,0,0,1, ldraw_lib__stud3(realsolid)],
// 1 16 0 4 0 1 0 0 0 -5 0 0 0 1 stud3.dat
  [1,16,0,4,0,1,0,0,0,-5,0,0,0,1, ldraw_lib__stud3(realsolid)],
// 1 16 20 4 0 1 0 0 0 -5 0 0 0 1 stud3.dat
  [1,16,20,4,0,1,0,0,0,-5,0,0,0,1, ldraw_lib__stud3(realsolid)],
// 4 16 -40 24 -10 40 24 -10 36 24 -6 -36 24 -6
  [4,16,-40,24,-10,40,24,-10,36,24,-6,-36,24,-6],
// 4 16 -40 24 10 -36 24 6 36 24 6 40 24 10
  [4,16,-40,24,10,-36,24,6,36,24,6,40,24,10],
// 4 16 -40 24 -10 -36 24 -6 -36 24 6 -40 24 10
  [4,16,-40,24,-10,-36,24,-6,-36,24,6,-40,24,10],
// 4 16 40 24 -10 40 24 10 36 24 6 36 24 -6
  [4,16,40,24,-10,40,24,10,36,24,6,36,24,-6],
// 0
];
module ldraw_lib__s__3010s01(step=0, col=false, unit=2/5, alt=false, line=0.2, solid=!$preview)
    makepoly(ldraw_lib__s__3010s01(solid), step=step, col=col, unit=unit, alt=alt, line=line, solid=solid);
ldraw_lib__s__3010s01(line=0.2);
// file: ../p/box5-12.scad
use <../lib.scad>
function ldraw_lib__box5_12() = [
// 0 Box with 5 Faces without Any Edges
// 0 Name: box5-12.dat
// 0 Author: Chris Dee [cwdee]
// 0 !LDRAW_ORG Primitive UPDATE 2009-02
// 0 !LICENSE Licensed under CC BY 2.0 and CC BY 4.0 : see CAreadme.txt
// 
// 0 BFC CERTIFY CCW
  [0,"BFC","CERTIFY"],
  [0,"BFC","CCW"],
// 
// 0 !HISTORY 2009-09-03 [PTadmin] Official Update 2009-02
// 
// 
// 4 16 1 1 1 1 1 -1 -1 1 -1 -1 1 1
  [4,16,1,1,1,1,1,-1,-1,1,-1,-1,1,1],
// 4 16 -1 0 1 1 0 1 1 1 1 -1 1 1
  [4,16,-1,0,1,1,0,1,1,1,1,-1,1,1],
// 4 16 -1 0 -1 -1 0 1 -1 1 1 -1 1 -1
  [4,16,-1,0,-1,-1,0,1,-1,1,1,-1,1,-1],
// 4 16 1 0 -1 -1 0 -1 -1 1 -1 1 1 -1
  [4,16,1,0,-1,-1,0,-1,-1,1,-1,1,1,-1],
// 4 16 1 0 1 1 0 -1 1 1 -1 1 1 1
  [4,16,1,0,1,1,0,-1,1,1,-1,1,1,1],
// 0
];
module ldraw_lib__box5_12(step=0, col=false, unit=2/5, alt=false, line=0.2, solid=!$preview)
    makepoly(ldraw_lib__box5_12(), step=step, col=col, unit=unit, alt=alt, line=line, solid=solid);
ldraw_lib__box5_12(line=0.2);
// file: 3010.scad
use <../lib.scad>
use <s/3010s01.scad>
function ldraw_lib__3010() = [
// 0 Brick  1 x  4
// 0 Name: 3010.dat
// 0 Author: James Jessiman
// 0 !LDRAW_ORG Part UPDATE 2025-09
// 0 !LICENSE Licensed under CC BY 4.0 : see CAreadme.txt
// 
// 0 BFC CERTIFY CCW
  [0,"BFC","CERTIFY"],
  [0,"BFC","CCW"],
// 
// 0 !HISTORY 2001-10-26 [PTadmin] Official Update 2001-01
// 0 !HISTORY 2002-05-07 {unknown} BFC Certification
// 0 !HISTORY 2002-06-11 [PTadmin] Official Update 2002-03
// 0 !HISTORY 2002-12-12 [hafhead] New subparted version
// 0 !HISTORY 2003-08-01 [PTadmin] Official Update 2003-02
// 0 !HISTORY 2007-06-06 [PTadmin] Header formatted for Contributor Agreement
// 0 !HISTORY 2008-07-01 [PTadmin] Official Update 2008-01
// 0 !HISTORY 2025-09-27 [OrionP] Changed winding to CCW
// 0 !HISTORY 2025-09-29 [OrionP] Official Update 2025-09
// 
// 1 16 0 0 0 1 0 0 0 1 0 0 0 1 s\3010s01.dat
  [1,16,0,0,0,1,0,0,0,1,0,0,0,1, ldraw_lib__s__3010s01()],
// 4 16 -40 24 -10 40 24 -10 40 0 -10 -40 0 -10
  [4,16,-40,24,-10,40,24,-10,40,0,-10,-40,0,-10],
// 0
];
module ldraw_lib__3010(step=0, col=false, unit=2/5, alt=false, line=0.2, solid=!$preview)
    makepoly(ldraw_lib__3010(), step=step, col=col, unit=unit, alt=alt, line=line, solid=solid);
ldraw_lib__3010(line=0.2);
// main file
use <../lib.scad>
use <194535c.scad>
use <3010.scad>
function ldraw_lib__3010d0d() = [
// 0 Brick  1 x  4 with White "ANWB" on Blue Background Sticker
// 0 Name: 3010d0d.dat
// 0 Author: Takeshi Takahashi [RainbowDolphin]
// 0 !LDRAW_ORG Shortcut UPDATE 2024-07
// 0 !LICENSE Licensed under CC BY 4.0 : see CAreadme.txt
// 
// 0 BFC CERTIFY CCW
  [0,"BFC","CERTIFY"],
  [0,"BFC","CCW"],
// 
// 0 !CATEGORY Sticker Shortcut
// 0 !KEYWORDS Breakdown assistance, Bricklink 3010pb037, Set 1590-2
// 
// 0 !HISTORY 2024-08-26 [OrionP] Official Update 2024-07
// 
// 1 16 0 0 0 1 0 0 0 1 0 0 0 1 3010.dat
  [1,16,0,0,0,1,0,0,0,1,0,0,0,1, ldraw_lib__3010()],
// 1 16 0 12 -10 1 0 0 0 0 -1 0 1 0 194535c.dat
  [1,16,0,12,-10,1,0,0,0,0,-1,0,1,0, ldraw_lib__194535c()],
];
module ldraw_lib__3010d0d(step=0, col=false, unit=2/5, alt=false, line=0.2, solid=!$preview)
    makepoly(ldraw_lib__3010d0d(), step=step, col=col, unit=unit, alt=alt, line=line, solid=solid);
ldraw_lib__3010d0d(line=0.2);
